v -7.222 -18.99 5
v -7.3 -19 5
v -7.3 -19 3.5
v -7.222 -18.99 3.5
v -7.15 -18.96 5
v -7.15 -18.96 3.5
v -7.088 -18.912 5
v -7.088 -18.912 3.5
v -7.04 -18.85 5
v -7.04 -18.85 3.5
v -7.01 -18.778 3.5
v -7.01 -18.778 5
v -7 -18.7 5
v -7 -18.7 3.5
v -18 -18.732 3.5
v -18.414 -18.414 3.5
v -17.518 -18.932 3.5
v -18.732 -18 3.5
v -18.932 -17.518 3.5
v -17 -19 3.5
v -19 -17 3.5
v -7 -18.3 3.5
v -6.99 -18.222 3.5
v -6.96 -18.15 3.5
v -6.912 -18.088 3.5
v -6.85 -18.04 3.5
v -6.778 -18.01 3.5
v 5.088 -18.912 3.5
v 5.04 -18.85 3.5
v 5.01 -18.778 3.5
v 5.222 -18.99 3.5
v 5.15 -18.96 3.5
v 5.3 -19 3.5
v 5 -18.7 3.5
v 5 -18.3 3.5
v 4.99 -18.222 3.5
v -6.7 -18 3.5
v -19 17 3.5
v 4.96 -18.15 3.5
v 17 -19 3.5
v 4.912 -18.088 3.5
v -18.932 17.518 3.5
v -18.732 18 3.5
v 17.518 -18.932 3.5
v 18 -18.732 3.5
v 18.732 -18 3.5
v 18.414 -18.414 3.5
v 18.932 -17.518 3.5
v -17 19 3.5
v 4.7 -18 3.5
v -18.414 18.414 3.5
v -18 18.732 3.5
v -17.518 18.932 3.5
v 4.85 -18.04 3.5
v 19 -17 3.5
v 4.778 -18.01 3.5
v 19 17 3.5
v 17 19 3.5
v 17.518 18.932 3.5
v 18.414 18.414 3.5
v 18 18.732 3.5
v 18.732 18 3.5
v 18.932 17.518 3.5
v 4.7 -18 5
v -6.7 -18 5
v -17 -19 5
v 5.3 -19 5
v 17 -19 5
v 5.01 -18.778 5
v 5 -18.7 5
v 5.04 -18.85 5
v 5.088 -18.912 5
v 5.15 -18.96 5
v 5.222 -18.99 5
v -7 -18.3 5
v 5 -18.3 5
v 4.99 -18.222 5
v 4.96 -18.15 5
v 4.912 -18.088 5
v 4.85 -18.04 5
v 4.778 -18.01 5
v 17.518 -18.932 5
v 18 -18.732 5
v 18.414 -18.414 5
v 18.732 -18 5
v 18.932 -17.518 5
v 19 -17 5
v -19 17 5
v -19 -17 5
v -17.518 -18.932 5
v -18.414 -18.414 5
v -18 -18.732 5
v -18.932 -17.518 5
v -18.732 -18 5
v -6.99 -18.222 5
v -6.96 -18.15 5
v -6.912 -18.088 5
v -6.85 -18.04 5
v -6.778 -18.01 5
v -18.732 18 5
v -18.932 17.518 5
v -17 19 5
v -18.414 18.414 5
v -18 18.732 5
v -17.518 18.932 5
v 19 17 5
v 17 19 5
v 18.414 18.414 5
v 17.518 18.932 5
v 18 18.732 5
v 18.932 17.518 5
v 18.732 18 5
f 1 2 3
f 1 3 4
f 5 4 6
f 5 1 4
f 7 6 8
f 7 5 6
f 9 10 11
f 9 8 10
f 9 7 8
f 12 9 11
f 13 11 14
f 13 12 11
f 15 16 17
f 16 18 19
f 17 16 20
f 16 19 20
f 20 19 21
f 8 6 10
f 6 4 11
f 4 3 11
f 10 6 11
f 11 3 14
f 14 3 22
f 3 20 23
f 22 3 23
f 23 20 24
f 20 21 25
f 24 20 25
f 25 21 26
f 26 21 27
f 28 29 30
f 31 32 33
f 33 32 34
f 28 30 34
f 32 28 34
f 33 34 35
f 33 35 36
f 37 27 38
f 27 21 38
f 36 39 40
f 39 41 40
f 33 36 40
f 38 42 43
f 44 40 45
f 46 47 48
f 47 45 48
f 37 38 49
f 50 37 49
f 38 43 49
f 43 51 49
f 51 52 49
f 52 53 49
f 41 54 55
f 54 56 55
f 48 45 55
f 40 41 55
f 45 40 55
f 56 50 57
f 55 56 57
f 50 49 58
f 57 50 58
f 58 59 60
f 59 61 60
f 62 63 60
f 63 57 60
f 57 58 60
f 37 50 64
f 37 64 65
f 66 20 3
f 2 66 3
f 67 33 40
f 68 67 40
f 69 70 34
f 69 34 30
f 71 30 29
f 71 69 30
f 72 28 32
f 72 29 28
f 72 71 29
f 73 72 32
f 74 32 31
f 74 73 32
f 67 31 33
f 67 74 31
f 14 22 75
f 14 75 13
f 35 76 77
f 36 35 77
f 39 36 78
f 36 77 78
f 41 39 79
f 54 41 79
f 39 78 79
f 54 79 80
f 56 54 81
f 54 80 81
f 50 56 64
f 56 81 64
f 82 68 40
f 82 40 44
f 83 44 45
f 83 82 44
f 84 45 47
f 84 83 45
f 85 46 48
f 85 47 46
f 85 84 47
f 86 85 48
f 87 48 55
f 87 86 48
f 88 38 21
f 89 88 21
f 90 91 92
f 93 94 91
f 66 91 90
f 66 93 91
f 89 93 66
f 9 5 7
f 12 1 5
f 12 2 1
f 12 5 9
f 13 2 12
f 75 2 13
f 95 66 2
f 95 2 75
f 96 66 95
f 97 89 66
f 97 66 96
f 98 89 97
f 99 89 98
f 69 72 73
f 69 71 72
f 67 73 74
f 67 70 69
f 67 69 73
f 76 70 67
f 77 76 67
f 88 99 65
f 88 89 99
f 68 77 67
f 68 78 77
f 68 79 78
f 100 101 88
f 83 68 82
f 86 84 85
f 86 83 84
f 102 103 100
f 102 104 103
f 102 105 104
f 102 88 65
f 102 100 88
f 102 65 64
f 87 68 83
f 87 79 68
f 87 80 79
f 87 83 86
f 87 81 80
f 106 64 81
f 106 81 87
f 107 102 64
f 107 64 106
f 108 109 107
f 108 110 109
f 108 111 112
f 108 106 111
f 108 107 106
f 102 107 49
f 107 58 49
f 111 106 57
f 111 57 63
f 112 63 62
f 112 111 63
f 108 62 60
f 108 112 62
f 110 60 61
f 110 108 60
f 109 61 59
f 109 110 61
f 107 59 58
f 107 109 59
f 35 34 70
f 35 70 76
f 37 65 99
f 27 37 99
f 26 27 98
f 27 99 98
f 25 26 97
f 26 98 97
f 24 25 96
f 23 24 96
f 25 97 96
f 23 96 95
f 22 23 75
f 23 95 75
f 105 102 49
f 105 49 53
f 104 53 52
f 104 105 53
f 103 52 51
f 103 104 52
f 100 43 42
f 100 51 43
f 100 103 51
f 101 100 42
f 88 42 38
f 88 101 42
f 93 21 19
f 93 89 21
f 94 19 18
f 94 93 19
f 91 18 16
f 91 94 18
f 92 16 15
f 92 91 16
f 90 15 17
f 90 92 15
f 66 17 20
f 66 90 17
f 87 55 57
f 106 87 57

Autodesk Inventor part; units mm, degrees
ref_plane "YZ Plane" through (0, 0, 0) normal (1, 0, 0) x (0, 1, 0)
ref_plane "XZ Plane" through (0, 0, 0) normal (0, 1, 0) x (-1, 0, 0)
ref_plane "РабПлоскость1" through (0, 0, 3.5) normal (0, 0, 1) x (1, 0, 0)
sketch "Эскиз1" plane through (0, 0, 3.5) normal (0, 0, 1) x (1, 0, 0)
  line L0 (-19, -19) -> (19, -19)
  line L1 (19, -19) -> (19, 19)
  line L2 (19, 19) -> (-19, 19)
  line L3 (-19, 19) -> (-19, -19)
  line L4 (-19, -19) -> (19, 19) construction
  line L5 (19, -19) -> (-19, 19) construction
  point P0 (0, 0)
  dimension "d1" = 38
  dimension "d2" = 38
extrude "Выдавливание1" add sketch "Эскиз1" along normal blind 1.5
fillet "Сопряжение1" radius 2 4 edges at (19, -19, 4.25) (19, 19, 4.25) (-19, 19, 4.25) (-19, -19, 4.25)
sketch "Эскиз2" plane through (0, 0, 3.5) normal (0, 0, -1) x (-1, 0, 0)
  line L0 (19, 17) -> (19, -17) projected
  line L1 (19, 0) -> (13, 0)
  line L2 (-17, 19) -> (17, 19) projected
  line L3 (13, 19) -> (13, -19)
  line L4 (17, -19) -> (-17, -19) projected
  line L5 (7, -19) -> (-5, -19)
  line L6 (-19, -19) -> (1, -19)
  line L7 (-19, -17) -> (-19, 17) projected
  line L8 (7, -20) -> (-5, -20)
  line L9 (-5, -20) -> (-5, -18)
  line L10 (-5, -18) -> (7, -18)
  line L11 (7, -18) -> (7, -20)
  line L12 (7, -20) -> (-5, -18) construction
  line L13 (-5, -20) -> (7, -18) construction
  point P0 (0, 0)
  point P1 (-5, -19)
  dimension "d6" = 6
  dimension "d7" = 12
  dimension "d8" = 20
  dimension "d9" = 2
extrude "Выдавливание2" cut sketch "Эскиз2" against normal blind 1.5 contours L4 L9 L10 L11
fillet "Сопряжение2" radius 0.3 4 edges at (-7, -19, 4.25) (-7, -18, 4.25) (5, -19, 4.25) (5, -18, 4.25)
sketch "Эскиз3" plane through (0, 0, 3.5) normal (0, 0, -1) x (-1, 0, 0)
  arc A0 (19, 17) -> (17, 19) centre (17, 17) ccw projected
  line L0 (19, 17) -> (19, 19)
  line L1 (19, 19) -> (9, 19)
  line L2 (9, 19) -> (9, -19)
  line L3 (17, -19) -> (7.3, -19) projected
  point P0 (0, 0)
  dimension "d13" = 10
properties part number "ButerBoard"
